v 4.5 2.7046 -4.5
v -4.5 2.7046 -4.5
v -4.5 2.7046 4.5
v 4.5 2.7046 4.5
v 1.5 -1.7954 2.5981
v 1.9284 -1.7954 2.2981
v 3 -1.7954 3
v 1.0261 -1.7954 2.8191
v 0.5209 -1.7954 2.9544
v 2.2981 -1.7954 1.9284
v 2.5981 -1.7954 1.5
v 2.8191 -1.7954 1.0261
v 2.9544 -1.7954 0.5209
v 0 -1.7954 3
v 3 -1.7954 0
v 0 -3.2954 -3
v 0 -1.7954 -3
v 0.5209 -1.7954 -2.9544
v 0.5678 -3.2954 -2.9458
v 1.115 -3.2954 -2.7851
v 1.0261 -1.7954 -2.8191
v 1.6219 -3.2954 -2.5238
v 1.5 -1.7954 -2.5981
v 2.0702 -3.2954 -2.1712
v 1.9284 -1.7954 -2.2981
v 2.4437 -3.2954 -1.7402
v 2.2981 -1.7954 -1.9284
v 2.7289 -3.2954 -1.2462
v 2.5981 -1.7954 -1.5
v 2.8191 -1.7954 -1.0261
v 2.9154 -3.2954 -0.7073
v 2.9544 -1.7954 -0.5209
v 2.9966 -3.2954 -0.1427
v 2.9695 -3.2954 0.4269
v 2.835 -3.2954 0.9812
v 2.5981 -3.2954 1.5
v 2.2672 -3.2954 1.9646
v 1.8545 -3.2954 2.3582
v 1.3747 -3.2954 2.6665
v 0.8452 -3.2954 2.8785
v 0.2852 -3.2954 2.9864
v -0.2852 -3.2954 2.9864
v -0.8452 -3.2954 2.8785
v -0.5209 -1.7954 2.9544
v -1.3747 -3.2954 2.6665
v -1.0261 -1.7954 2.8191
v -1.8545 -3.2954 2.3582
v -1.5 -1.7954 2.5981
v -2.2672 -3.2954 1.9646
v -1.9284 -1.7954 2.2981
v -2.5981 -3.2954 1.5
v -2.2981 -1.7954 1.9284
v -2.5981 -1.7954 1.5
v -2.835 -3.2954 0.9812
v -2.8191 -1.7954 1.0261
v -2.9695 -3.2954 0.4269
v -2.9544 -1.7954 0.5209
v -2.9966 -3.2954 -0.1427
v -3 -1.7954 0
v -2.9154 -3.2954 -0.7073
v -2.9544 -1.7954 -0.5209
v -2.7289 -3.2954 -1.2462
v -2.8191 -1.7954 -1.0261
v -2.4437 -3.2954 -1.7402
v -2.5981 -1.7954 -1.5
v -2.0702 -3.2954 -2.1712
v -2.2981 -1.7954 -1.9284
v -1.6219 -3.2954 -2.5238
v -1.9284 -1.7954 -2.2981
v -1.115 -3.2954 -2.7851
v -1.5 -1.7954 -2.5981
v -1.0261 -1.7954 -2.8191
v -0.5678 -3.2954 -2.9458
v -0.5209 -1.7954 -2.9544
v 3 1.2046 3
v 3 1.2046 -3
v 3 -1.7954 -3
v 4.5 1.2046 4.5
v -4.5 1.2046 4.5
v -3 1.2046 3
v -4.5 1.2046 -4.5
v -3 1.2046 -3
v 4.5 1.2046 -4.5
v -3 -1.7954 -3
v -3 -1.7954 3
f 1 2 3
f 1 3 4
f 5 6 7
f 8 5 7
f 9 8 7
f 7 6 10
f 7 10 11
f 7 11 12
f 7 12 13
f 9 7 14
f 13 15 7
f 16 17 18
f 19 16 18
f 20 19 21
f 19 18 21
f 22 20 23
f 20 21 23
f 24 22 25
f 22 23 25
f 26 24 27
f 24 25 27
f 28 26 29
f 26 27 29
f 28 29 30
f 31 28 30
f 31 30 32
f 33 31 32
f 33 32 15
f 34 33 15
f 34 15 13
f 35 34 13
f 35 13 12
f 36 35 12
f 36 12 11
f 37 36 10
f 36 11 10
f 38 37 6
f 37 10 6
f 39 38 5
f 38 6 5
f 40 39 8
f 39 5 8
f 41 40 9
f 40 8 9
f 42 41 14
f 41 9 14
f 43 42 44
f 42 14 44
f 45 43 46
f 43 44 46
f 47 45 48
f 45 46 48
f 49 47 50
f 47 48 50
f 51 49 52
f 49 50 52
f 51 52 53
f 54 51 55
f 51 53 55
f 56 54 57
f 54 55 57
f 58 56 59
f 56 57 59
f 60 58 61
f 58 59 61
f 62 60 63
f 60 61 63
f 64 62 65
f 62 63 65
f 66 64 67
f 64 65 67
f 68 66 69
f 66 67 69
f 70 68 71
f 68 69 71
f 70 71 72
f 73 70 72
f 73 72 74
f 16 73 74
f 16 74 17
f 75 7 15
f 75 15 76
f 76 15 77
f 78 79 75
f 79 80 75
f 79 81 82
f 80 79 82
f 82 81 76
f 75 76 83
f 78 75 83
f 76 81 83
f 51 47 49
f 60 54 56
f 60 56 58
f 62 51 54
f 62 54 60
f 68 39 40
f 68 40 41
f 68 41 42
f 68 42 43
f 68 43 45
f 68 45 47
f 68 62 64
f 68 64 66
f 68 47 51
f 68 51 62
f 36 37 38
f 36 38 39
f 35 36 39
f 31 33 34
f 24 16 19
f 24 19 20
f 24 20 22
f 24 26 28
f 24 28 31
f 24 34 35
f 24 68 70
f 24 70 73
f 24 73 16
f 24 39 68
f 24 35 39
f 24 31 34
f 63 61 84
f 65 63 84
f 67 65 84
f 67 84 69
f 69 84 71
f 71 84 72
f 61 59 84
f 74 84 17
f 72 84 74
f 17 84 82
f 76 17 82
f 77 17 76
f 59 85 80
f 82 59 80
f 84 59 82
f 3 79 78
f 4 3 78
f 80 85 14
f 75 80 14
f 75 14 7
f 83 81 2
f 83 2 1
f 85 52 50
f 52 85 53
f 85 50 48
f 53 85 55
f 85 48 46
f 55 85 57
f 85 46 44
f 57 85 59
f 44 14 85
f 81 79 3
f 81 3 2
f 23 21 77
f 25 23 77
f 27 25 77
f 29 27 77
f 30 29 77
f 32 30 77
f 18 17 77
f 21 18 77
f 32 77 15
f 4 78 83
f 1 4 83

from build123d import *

# Parameters (mm, degrees)
SKETCH1_W           = 1
SKETCH1_H           = 1
BOSS_EXTRUDE1_DEPTH = 0.5
SKETCH2_W           = 1.5
SKETCH2_H           = 1.5
BOSS_EXTRUDE2_DEPTH = 0.25
SKETCH3_R           = 0.5
BOSS_EXTRUDE3_DEPTH = 0.25
SCALE1_SCALE        = 6


with BuildPart() as part:
    # Sketch1 → Boss-Extrude1 (new body)
    with BuildSketch(Plane(origin=(0, 0, 0), x_dir=(1, 0, 0), z_dir=(0, 1, 0))):
        Rectangle(SKETCH1_W, SKETCH1_H)
    extrude(amount=BOSS_EXTRUDE1_DEPTH)

    # Sketch2 → Boss-Extrude2 (add)
    with BuildSketch(Plane(origin=(0, 0.5, 0), x_dir=(1, 0, 0), z_dir=(0, 1, 0))):
        Rectangle(SKETCH2_W, SKETCH2_H)
    extrude(amount=BOSS_EXTRUDE2_DEPTH)

    # Sketch3 → Boss-Extrude3 (add)
    with BuildSketch(Plane.XZ):
        with Locations(Location((0, 0, 0), (0, 0, 270))):
            Circle(SKETCH3_R)
    extrude(amount=BOSS_EXTRUDE3_DEPTH)


with BuildPart() as part_1:
    # Scale1: scaled about (0, 0.359072941, 0)
    add(part.part.scale(SCALE1_SCALE).moved(Location((0, -1.795364705, 0))))


solid = part_1.part
